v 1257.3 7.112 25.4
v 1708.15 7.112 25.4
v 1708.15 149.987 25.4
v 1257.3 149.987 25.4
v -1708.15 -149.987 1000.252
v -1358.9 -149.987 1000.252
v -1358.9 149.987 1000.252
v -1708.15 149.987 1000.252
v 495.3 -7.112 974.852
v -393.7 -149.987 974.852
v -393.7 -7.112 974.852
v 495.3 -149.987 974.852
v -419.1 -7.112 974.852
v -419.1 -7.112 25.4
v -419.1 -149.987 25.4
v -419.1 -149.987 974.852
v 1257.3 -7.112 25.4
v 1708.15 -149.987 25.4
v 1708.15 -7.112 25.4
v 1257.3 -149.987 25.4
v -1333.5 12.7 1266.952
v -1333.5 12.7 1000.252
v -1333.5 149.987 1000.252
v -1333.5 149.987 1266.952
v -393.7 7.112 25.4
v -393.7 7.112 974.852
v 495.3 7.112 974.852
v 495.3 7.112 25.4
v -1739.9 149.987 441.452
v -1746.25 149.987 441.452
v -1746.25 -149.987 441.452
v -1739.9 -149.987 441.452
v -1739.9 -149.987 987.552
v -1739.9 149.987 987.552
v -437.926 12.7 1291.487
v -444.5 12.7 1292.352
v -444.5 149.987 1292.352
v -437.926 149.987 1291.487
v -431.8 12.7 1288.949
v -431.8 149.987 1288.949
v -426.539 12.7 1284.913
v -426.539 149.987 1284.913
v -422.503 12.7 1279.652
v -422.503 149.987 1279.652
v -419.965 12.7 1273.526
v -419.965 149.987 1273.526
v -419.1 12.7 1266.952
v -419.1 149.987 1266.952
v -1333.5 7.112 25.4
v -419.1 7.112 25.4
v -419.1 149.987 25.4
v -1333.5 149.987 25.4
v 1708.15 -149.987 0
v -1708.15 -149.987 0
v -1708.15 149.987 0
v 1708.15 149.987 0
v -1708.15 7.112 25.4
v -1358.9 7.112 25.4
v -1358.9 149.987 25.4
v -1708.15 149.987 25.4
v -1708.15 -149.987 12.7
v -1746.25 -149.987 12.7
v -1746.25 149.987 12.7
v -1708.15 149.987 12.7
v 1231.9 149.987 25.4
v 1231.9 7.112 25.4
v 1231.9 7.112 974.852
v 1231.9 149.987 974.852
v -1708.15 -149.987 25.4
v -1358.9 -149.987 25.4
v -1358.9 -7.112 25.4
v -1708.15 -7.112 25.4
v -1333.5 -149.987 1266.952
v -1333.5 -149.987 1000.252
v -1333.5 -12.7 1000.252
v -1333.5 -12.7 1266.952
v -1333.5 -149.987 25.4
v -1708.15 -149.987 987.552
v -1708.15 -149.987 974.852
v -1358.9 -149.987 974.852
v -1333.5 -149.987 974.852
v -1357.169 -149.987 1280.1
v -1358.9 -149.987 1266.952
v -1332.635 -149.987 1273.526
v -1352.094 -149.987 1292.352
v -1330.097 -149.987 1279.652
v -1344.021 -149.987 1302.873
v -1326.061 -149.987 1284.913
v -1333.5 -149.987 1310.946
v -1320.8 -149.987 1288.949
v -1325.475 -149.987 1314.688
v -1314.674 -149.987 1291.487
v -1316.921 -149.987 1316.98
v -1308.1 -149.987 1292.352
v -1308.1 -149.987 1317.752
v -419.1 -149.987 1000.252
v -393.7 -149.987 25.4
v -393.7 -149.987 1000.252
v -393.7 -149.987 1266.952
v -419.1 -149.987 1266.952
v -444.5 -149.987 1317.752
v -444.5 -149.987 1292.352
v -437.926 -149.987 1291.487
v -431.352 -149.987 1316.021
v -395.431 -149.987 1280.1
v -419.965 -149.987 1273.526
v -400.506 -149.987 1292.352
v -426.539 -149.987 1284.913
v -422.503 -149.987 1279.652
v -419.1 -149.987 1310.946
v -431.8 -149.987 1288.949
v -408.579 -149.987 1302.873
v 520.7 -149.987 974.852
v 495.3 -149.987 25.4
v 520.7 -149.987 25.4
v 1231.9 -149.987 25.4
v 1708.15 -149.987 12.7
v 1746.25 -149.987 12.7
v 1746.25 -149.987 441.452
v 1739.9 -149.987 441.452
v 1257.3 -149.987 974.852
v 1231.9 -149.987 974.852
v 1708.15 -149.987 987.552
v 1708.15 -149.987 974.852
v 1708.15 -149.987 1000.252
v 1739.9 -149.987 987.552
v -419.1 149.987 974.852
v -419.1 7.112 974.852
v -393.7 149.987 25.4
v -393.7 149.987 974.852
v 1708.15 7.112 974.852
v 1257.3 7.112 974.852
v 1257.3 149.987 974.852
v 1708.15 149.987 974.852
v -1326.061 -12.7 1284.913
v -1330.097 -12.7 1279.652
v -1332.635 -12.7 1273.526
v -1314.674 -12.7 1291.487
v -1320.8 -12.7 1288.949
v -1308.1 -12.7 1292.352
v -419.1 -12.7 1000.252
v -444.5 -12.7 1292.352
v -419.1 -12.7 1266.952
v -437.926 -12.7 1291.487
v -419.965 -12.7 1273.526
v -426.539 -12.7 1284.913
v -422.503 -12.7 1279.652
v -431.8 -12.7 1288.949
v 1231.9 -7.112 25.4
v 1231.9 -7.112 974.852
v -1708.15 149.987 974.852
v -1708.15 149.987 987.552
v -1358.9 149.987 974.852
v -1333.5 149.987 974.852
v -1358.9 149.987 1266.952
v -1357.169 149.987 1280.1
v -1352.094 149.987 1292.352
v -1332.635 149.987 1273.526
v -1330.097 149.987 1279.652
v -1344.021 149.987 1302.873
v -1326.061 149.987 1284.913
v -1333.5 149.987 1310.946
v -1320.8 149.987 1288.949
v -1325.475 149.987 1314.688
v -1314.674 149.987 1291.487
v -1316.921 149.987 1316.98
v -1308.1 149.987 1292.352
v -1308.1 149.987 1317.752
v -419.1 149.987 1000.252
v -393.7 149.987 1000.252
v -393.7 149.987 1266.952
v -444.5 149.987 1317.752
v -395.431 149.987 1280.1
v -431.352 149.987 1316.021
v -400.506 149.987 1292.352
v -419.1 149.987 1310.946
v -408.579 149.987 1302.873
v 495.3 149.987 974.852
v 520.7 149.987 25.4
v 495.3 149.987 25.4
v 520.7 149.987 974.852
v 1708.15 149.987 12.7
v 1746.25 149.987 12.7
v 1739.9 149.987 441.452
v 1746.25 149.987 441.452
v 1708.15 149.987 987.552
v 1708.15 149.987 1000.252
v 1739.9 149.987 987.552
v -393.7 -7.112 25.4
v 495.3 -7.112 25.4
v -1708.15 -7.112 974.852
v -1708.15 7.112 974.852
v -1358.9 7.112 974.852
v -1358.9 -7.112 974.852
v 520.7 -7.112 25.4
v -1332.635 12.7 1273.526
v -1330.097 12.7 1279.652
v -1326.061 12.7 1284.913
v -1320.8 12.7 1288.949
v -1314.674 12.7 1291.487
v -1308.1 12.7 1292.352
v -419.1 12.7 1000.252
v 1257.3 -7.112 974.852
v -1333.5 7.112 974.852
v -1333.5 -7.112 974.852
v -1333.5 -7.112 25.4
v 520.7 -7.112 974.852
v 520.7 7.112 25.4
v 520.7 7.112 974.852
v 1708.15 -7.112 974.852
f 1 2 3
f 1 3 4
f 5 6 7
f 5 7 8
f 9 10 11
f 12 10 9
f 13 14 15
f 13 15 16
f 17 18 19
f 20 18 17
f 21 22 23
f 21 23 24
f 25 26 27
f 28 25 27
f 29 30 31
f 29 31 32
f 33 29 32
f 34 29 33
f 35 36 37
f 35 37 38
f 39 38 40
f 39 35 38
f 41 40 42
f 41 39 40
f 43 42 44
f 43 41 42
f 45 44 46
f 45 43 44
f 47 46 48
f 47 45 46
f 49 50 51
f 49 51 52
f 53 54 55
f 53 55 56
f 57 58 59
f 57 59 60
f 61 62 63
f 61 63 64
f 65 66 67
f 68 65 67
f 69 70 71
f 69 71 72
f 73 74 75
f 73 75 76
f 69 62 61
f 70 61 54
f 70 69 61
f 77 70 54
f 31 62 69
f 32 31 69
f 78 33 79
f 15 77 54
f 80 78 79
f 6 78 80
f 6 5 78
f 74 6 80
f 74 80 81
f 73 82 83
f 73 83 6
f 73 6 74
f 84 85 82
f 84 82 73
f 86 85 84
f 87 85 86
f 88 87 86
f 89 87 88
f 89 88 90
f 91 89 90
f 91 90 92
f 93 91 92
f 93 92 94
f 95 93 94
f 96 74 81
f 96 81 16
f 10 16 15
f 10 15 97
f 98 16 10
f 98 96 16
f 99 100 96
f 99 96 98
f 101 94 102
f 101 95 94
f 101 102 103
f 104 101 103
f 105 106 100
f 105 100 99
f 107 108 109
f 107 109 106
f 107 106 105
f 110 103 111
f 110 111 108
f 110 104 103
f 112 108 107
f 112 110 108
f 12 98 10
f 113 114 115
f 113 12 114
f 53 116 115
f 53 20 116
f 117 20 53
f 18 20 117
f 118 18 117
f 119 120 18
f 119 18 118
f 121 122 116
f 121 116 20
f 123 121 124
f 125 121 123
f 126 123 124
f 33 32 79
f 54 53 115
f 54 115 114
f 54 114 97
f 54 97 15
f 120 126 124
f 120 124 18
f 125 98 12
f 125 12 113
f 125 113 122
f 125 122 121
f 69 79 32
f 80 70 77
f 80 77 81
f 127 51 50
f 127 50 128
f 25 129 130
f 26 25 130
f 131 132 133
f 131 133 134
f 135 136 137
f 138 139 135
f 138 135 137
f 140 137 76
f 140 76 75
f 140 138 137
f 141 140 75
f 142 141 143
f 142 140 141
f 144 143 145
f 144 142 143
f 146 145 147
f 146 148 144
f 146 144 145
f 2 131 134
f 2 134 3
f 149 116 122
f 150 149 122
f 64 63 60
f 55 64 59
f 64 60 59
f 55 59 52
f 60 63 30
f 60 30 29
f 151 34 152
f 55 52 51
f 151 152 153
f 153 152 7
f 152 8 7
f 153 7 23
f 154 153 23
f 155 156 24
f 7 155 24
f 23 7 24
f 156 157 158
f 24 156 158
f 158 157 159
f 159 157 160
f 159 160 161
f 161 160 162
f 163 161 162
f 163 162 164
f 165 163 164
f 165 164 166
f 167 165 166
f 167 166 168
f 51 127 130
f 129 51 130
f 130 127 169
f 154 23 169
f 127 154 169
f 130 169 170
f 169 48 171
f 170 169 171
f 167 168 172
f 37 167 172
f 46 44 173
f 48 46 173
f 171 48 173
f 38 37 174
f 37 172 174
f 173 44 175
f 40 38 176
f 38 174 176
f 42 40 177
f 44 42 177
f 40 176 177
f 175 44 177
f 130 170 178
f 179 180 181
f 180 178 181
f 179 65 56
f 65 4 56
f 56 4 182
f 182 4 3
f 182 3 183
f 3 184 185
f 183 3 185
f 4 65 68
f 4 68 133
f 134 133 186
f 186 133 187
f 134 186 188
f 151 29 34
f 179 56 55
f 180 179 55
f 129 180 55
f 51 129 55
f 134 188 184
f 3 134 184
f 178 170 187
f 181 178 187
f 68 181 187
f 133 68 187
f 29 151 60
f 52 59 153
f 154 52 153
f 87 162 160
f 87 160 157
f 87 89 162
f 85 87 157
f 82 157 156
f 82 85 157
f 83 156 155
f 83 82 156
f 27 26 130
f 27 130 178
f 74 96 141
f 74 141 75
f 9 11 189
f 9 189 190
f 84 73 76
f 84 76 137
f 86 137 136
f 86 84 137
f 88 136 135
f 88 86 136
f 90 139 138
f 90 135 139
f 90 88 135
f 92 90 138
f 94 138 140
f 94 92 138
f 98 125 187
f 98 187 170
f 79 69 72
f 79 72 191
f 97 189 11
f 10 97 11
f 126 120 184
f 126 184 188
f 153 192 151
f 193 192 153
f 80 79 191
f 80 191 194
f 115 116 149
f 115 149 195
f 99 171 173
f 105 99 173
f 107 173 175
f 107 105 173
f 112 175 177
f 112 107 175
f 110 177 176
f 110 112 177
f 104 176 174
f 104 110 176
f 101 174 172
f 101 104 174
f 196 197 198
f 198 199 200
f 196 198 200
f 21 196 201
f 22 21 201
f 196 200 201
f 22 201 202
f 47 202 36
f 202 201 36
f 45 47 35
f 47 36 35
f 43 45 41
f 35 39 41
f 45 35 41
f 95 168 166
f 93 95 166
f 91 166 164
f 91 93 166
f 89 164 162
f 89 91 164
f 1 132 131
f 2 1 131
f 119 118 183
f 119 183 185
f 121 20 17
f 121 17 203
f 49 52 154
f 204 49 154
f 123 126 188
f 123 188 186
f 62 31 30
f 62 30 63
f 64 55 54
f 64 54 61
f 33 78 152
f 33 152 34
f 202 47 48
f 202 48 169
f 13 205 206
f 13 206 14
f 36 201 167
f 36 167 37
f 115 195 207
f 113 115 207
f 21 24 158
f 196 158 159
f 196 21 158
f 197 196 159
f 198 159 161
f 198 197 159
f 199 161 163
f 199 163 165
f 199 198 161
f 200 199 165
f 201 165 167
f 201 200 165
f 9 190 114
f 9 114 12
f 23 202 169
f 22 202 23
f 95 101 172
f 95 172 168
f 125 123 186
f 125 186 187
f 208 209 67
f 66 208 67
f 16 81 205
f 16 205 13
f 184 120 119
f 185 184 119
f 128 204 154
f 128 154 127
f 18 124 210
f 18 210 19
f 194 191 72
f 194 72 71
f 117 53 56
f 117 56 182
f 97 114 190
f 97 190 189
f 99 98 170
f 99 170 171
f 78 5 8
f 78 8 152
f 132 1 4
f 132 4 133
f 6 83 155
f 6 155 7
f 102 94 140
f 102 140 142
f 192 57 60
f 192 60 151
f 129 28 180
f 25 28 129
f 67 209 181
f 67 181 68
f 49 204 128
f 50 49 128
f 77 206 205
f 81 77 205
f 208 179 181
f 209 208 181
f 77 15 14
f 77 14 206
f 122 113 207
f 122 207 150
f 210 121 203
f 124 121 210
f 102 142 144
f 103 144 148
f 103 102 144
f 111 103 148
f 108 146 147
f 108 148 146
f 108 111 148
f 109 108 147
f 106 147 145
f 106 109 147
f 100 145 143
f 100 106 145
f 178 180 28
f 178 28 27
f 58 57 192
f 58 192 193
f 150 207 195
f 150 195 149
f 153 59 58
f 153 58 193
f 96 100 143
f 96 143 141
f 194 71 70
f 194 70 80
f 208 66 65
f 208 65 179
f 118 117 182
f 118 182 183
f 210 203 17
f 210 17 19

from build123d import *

# Parameters (mm, degrees)
F0_W      = 3492.5
F0_H      = 1000.252
F1_DEPTH  = 7.112
F3_DEPTH  = 149.987
F4_W      = 6.35
F4_H      = 558.8
F5_DEPTH  = 152.4
F6_W      = 69.6651035309
F6_H      = 32.1860781174
F6_W_2    = 61.0528284073
F6_H_2    = 46.4129915695
F6_W_3    = 67.1003156662
F6_H_3    = 41.8257090867
F6_W_4    = 72.7439218521
F6_H_4    = 49.2695767105
F7_DEPTH  = 299.975
F9_DEPTH  = 12.7
F10_DEPTH = 149.987
F8_W      = 25.4
F8_H      = 949.452
F11_DEPTH = 149.987


with BuildPart() as f1:
    # F0 (on Front) → F1 (new body, symmetric)
    with BuildSketch(Plane.XZ):
        with Locations((0, 500.126)):
            Rectangle(F0_W, F0_H)
    extrude(amount=F1_DEPTH, both=True)

    # F2 (on Front) → F3 (join, symmetric)
    with BuildSketch(Plane.XZ):
        Polygon((-1708.15, 12.7), (-1708.15, 0), (1708.15, 0), (1708.15, 12.7), (1708.15, 25.4), (-1708.15, 25.4), align=None)
        Polygon((-1746.25, 12.7), (-1708.15, 12.7), (-1708.15, 25.4), (-1708.15, 974.852), (-1708.15, 987.552), (-1746.25, 987.552), align=None)
        Polygon((1708.15, 25.4), (1708.15, 12.7), (1746.25, 12.7), (1746.25, 987.552), (1708.15, 987.552), (1708.15, 974.852), align=None)
        Polygon((-1708.15, 987.552), (-1708.15, 974.852), (1708.15, 974.852), (1708.15, 987.552), (1708.15, 1000.252), (-1708.15, 1000.252), align=None)
    extrude(amount=F3_DEPTH, both=True)

    # F4 (on Front) → F5 (cut, symmetric)
    with BuildSketch(Plane.XZ):
        with Locations((-1743.075, 720.852)):
            Rectangle(F4_W, F4_H)
        with Locations((1743.075, 720.852)):
            Rectangle(F4_W, F4_H)
    extrude(amount=F5_DEPTH, both=True, mode=Mode.SUBTRACT)

    # F6 (on face) → F7 (cut, through all)
    with BuildSketch(Plane.XZ.offset(149.987)):
        with Locations((-1742.9825517654, 1003.6450390587)):
            Rectangle(F6_W, F6_H)
        with Locations((1738.6764142036, 1010.7584957848)):
            Rectangle(F6_W_2, F6_H_2)
        with Locations((1741.7001578331, -8.2128545433)):
            Rectangle(F6_W_3, F6_H_3)
        with Locations((-1744.5219609261, -11.9347883552)):
            Rectangle(F6_W_4, F6_H_4)
    extrude(amount=-F7_DEPTH, mode=Mode.SUBTRACT)

    # F8 (on Front) → F9 (join, symmetric)
    with BuildSketch(Plane.XZ):
        with BuildLine():
            Line((-1333.5, 1266.952), (-1333.5, 974.852))
            Line((-1333.5, 974.852), (-419.1, 974.852))
            Line((-419.1, 974.852), (-419.1, 1266.952))
            ThreePointArc((-419.1, 1266.952), (-426.5394877579, 1284.9125122421), (-444.5, 1292.352))
            Line((-444.5, 1292.352), (-1308.1, 1292.352))
            ThreePointArc((-1308.1, 1292.352), (-1326.0605122421, 1284.9125122421), (-1333.5, 1266.952))
        make_face()
    extrude(amount=F9_DEPTH, both=True)

    # F8 (on Front) → F10 (join, symmetric)
    with BuildSketch(Plane.XZ):
        with BuildLine():
            Line((-1358.9, 1266.952), (-1358.9, 974.852))
            Line((-1358.9, 974.852), (-1333.5, 974.852))
            Line((-1333.5, 974.852), (-1333.5, 1266.952))
            Line((-1333.5, 1266.952), (-1333.5, 1310.9460905122))
            ThreePointArc((-1333.5, 1310.9460905122), (-1352.0940905122, 1292.352), (-1358.9, 1266.952))
        make_face()
        with BuildLine():
            Line((-419.1, 1266.952), (-419.1, 974.852))
            Line((-419.1, 974.852), (-393.7, 974.852))
            Line((-393.7, 974.852), (-393.7, 1266.952))
            ThreePointArc((-393.7, 1266.952), (-408.5789755157, 1302.8730244843), (-444.5, 1317.752))
            Line((-444.5, 1317.752), (-1308.1, 1317.752))
            ThreePointArc((-1308.1, 1317.752), (-1321.2480074912, 1316.0210319755), (-1333.5, 1310.9460905122))
            Line((-1333.5, 1310.9460905122), (-1333.5, 1266.952))
            ThreePointArc((-1333.5, 1266.952), (-1326.0605122421, 1284.9125122421), (-1308.1, 1292.352))
            Line((-1308.1, 1292.352), (-444.5, 1292.352))
            ThreePointArc((-444.5, 1292.352), (-426.5394877579, 1284.9125122421), (-419.1, 1266.952))
        make_face()
    extrude(amount=F10_DEPTH, both=True)

    # F8 (on Front) → F11 (join, symmetric)
    with BuildSketch(Plane.XZ):
        with Locations((-1346.2, 500.126)):
            Rectangle(F8_W, F8_H)
        with Locations((-406.4, 500.126)):
            Rectangle(F8_W, F8_H)
        with Locations((508, 500.126)):
            Rectangle(F8_W, F8_H)
        with Locations((1244.6, 500.126)):
            Rectangle(F8_W, F8_H)
    extrude(amount=F11_DEPTH, both=True)


solid = f1.part
